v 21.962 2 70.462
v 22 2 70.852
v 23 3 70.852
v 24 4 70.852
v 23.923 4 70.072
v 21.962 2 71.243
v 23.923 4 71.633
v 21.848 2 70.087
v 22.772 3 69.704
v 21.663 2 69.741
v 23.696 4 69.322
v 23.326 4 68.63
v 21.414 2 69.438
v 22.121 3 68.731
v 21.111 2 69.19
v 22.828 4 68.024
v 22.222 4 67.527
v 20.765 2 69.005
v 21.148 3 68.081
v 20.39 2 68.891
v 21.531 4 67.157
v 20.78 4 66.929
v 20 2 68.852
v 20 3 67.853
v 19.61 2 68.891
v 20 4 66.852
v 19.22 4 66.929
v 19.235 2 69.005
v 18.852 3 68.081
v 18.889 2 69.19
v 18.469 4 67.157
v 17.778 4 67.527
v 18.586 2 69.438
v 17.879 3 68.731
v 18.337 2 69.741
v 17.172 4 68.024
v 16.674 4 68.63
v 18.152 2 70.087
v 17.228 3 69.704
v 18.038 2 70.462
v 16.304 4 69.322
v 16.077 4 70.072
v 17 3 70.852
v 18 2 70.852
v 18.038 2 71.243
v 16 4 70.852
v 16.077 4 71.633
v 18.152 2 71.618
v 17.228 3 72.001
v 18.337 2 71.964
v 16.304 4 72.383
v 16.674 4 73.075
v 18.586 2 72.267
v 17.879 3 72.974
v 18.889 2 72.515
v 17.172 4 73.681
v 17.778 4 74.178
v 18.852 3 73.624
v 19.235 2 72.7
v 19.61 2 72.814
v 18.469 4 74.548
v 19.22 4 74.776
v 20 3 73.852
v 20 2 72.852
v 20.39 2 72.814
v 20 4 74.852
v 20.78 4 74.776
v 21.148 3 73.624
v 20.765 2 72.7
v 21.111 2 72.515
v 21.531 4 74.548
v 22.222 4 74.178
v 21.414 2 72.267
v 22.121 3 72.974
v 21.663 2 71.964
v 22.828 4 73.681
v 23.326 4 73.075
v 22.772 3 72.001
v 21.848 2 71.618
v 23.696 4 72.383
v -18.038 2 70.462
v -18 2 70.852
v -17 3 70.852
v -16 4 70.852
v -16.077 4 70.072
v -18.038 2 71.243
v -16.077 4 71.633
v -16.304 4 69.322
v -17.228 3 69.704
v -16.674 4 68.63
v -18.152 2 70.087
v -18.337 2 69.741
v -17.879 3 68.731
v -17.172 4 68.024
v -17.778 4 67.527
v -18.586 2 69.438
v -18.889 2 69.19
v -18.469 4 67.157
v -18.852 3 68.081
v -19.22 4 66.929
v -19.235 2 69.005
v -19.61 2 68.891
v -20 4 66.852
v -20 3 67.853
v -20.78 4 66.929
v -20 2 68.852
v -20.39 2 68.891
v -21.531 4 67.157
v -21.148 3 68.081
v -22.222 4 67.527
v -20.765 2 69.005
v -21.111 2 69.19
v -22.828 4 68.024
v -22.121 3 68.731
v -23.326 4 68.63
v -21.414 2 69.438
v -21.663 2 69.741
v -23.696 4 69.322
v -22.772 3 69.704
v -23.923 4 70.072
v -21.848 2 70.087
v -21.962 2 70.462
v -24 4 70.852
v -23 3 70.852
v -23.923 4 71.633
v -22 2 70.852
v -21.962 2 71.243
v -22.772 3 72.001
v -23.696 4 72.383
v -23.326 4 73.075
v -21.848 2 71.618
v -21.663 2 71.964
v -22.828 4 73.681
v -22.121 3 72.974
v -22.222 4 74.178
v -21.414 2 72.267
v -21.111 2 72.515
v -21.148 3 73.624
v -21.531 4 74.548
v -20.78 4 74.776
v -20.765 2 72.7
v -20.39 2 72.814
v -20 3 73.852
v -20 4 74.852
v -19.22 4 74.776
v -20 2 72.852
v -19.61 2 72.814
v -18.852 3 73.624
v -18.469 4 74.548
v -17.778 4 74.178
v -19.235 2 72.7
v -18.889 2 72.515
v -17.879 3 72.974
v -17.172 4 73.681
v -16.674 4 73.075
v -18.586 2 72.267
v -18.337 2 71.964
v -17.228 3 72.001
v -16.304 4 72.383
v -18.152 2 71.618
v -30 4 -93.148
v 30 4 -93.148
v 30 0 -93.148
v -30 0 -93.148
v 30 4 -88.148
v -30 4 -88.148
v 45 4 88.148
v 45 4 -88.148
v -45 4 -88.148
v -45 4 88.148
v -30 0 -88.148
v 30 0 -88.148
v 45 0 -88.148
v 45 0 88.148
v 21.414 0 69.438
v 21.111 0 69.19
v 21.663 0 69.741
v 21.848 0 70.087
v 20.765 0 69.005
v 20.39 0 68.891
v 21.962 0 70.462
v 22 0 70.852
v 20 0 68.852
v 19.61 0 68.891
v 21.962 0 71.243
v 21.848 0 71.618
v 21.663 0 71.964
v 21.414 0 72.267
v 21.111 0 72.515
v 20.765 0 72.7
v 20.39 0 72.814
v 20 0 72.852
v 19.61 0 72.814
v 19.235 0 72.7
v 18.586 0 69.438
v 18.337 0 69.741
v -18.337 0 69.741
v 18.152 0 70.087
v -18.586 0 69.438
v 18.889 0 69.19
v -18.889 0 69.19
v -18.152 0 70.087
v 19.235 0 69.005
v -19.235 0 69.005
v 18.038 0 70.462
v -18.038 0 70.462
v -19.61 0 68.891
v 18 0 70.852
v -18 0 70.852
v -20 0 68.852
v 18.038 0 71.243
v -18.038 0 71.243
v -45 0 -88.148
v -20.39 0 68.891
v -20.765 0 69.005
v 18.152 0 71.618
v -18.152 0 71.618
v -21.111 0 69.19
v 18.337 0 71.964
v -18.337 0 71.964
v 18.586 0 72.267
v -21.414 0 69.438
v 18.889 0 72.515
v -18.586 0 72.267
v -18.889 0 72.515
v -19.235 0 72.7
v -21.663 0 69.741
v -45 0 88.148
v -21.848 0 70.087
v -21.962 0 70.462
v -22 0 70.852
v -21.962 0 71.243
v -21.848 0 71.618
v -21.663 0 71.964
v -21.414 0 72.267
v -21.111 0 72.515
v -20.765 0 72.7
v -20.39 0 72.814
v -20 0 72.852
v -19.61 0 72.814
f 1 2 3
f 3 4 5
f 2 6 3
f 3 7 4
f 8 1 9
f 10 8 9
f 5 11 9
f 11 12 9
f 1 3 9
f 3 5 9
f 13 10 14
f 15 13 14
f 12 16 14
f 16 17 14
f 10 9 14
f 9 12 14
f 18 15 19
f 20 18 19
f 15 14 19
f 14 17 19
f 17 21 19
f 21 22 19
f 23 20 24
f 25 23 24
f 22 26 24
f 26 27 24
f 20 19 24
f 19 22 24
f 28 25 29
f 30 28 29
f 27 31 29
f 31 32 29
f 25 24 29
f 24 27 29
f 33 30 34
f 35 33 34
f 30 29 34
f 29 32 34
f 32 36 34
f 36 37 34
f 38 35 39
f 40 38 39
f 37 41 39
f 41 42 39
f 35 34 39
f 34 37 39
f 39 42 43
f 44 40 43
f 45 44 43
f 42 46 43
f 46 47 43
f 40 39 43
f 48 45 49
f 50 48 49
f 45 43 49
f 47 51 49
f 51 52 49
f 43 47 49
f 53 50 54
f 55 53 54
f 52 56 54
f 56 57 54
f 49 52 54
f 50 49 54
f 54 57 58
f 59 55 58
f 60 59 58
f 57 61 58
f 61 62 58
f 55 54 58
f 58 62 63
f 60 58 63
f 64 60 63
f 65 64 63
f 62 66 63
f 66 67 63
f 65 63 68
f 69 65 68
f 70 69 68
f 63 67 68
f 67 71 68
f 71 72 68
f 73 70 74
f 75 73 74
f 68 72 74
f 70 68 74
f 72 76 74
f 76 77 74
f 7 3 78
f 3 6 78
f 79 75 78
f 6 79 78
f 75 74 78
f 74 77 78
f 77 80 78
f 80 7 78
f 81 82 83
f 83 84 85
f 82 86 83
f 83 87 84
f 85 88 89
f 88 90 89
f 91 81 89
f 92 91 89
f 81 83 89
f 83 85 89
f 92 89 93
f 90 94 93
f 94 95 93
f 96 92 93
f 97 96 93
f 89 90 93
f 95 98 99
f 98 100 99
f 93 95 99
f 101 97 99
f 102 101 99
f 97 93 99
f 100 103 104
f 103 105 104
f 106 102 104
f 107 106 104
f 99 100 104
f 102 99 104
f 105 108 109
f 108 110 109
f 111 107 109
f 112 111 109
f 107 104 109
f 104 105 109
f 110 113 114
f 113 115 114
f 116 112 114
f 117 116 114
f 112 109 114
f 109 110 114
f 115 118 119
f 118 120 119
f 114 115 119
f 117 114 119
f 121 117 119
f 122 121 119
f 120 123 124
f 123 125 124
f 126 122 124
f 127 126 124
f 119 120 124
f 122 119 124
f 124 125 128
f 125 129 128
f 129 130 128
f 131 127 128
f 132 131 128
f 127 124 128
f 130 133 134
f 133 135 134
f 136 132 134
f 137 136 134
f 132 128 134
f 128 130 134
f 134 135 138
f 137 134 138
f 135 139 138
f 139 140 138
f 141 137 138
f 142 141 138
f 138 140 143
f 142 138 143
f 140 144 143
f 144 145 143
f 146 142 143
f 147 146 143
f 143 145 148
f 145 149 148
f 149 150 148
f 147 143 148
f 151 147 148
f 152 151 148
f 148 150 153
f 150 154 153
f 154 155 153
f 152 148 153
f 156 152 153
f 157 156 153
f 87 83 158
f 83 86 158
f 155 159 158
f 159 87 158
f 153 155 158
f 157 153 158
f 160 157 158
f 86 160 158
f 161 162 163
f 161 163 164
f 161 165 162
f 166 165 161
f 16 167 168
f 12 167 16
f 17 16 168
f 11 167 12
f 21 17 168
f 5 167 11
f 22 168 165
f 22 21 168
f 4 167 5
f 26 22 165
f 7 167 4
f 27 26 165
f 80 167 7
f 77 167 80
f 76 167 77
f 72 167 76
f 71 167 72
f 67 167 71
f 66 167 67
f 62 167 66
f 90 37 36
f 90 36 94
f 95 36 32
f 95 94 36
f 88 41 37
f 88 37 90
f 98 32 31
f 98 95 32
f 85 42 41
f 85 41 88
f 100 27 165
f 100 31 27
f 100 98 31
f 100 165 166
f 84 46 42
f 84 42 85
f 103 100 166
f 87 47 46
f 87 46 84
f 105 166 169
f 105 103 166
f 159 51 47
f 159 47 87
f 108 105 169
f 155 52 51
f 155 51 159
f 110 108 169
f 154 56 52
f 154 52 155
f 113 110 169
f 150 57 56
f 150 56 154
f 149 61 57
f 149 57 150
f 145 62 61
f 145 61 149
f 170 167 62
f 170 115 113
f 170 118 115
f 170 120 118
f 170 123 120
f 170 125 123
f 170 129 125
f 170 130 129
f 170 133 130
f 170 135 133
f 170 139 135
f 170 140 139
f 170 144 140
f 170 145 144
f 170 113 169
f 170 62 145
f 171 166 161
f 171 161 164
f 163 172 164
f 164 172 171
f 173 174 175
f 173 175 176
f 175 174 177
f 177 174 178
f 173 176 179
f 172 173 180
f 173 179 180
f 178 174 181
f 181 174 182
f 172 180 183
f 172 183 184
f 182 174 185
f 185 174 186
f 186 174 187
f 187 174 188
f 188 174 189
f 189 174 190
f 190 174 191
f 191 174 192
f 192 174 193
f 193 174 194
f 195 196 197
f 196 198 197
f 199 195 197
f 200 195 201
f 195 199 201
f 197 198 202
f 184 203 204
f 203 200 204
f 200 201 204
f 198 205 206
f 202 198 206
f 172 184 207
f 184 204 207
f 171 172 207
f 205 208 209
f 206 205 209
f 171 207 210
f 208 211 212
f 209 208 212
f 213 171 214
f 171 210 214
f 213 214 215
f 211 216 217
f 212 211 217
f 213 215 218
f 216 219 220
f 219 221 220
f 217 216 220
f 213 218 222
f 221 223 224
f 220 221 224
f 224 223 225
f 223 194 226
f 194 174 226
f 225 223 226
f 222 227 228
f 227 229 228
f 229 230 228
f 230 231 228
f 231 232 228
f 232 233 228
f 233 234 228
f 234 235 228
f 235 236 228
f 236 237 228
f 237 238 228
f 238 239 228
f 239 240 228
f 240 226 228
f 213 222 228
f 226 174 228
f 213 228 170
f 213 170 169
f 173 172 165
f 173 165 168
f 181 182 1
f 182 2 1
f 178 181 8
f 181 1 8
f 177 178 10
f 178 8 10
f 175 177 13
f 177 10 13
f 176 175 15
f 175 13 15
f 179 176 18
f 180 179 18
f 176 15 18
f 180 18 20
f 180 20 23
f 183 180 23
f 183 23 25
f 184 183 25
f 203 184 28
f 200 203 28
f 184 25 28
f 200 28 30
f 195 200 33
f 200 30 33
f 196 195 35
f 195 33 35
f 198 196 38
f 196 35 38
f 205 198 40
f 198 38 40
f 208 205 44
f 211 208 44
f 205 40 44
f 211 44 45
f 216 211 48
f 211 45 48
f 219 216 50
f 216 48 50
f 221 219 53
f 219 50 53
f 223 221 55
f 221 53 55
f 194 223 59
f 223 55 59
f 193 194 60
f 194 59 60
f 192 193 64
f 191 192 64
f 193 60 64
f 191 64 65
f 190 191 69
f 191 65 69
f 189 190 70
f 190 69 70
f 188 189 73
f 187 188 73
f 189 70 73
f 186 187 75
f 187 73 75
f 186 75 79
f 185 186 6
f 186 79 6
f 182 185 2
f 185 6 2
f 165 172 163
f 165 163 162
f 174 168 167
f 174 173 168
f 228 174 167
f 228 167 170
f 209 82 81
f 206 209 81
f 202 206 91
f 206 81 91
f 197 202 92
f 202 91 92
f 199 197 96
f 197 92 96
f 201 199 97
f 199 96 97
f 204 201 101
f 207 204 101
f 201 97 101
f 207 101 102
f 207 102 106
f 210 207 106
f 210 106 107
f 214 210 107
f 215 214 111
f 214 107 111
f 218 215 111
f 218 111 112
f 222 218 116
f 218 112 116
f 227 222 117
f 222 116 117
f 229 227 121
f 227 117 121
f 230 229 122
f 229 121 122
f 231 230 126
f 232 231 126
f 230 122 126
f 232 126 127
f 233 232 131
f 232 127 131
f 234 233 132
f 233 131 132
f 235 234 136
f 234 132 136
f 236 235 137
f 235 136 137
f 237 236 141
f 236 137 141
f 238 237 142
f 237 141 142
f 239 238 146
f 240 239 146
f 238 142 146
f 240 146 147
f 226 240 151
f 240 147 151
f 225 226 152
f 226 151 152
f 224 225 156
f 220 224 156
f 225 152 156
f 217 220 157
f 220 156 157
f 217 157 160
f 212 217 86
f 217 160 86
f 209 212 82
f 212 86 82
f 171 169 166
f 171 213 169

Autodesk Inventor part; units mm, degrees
ref_plane "YZ Plane" through (0, 0, 0) normal (1, 0, 0) x (0, 1, 0)
ref_plane "XZ Plane" through (0, 0, 0) normal (0, 1, 0) x (-1, 0, 0)
ref_plane "XY Plane" through (0, 0, 0) normal (0, 0, 1) x (1, 0, 0)
sketch "Эскиз1" plane through (0, 0, 0) normal (0, 1, 0) x (-1, 0, 0)
  line L0 (-45, 88.1475) -> (45, 88.1475)
  line L1 (45, 88.1475) -> (45, -88.1475)
  line L2 (45, -88.1475) -> (-45, -88.1475)
  line L3 (-45, -88.1475) -> (-45, 88.1475)
  line L4 (-45, 88.1475) -> (45, -88.1475) construction
  line L5 (45, 88.1475) -> (-45, -88.1475) construction
  point P0 (0, 0)
  dimension "d0" = 90
  dimension "d1" = 176.295
extrude "Выдавливание1" add sketch "Эскиз1" along normal blind 4
sketch "Эскиз2" plane through (0, 4, 0) normal (0, 1, 0) x (1, 0, 0)
  circle A0 centre (-20, -70.8525) radius 2 projected
  circle A1 centre (20, -70.8525) radius 2 projected
  point P0 (0, 0)
extrude "Выдавливание2" cut sketch "Эскиз2" against normal through all
chamfer "Фаска1" distance 2 angle 45 2 edges at (-22, 4, 70.8525) (18, 4, 70.8525)
sketch "Эскиз3" plane through (45, 0, -88.1475) normal (0, 0, -1) x (-1, 0, 0)
  line L0 (90, 4) -> (0, 4) projected
  line L1 (90, 0) -> (0, 0) projected
  line L2 (15, 4) -> (75, 4)
  line L3 (75, 4) -> (75, 0)
  line L4 (75, 0) -> (15, 0)
  line L5 (15, 0) -> (15, 4)
  point P0 (45, 0)
  point P1 (45, 0)
  dimension "d9" = 60
  dimension "d10" = 30
extrude "Выдавливание3" add sketch "Эскиз3" along normal blind 5
equation "\"d10\" = 0.5 * d9"
properties part number "000.005.003 - Крышка"
